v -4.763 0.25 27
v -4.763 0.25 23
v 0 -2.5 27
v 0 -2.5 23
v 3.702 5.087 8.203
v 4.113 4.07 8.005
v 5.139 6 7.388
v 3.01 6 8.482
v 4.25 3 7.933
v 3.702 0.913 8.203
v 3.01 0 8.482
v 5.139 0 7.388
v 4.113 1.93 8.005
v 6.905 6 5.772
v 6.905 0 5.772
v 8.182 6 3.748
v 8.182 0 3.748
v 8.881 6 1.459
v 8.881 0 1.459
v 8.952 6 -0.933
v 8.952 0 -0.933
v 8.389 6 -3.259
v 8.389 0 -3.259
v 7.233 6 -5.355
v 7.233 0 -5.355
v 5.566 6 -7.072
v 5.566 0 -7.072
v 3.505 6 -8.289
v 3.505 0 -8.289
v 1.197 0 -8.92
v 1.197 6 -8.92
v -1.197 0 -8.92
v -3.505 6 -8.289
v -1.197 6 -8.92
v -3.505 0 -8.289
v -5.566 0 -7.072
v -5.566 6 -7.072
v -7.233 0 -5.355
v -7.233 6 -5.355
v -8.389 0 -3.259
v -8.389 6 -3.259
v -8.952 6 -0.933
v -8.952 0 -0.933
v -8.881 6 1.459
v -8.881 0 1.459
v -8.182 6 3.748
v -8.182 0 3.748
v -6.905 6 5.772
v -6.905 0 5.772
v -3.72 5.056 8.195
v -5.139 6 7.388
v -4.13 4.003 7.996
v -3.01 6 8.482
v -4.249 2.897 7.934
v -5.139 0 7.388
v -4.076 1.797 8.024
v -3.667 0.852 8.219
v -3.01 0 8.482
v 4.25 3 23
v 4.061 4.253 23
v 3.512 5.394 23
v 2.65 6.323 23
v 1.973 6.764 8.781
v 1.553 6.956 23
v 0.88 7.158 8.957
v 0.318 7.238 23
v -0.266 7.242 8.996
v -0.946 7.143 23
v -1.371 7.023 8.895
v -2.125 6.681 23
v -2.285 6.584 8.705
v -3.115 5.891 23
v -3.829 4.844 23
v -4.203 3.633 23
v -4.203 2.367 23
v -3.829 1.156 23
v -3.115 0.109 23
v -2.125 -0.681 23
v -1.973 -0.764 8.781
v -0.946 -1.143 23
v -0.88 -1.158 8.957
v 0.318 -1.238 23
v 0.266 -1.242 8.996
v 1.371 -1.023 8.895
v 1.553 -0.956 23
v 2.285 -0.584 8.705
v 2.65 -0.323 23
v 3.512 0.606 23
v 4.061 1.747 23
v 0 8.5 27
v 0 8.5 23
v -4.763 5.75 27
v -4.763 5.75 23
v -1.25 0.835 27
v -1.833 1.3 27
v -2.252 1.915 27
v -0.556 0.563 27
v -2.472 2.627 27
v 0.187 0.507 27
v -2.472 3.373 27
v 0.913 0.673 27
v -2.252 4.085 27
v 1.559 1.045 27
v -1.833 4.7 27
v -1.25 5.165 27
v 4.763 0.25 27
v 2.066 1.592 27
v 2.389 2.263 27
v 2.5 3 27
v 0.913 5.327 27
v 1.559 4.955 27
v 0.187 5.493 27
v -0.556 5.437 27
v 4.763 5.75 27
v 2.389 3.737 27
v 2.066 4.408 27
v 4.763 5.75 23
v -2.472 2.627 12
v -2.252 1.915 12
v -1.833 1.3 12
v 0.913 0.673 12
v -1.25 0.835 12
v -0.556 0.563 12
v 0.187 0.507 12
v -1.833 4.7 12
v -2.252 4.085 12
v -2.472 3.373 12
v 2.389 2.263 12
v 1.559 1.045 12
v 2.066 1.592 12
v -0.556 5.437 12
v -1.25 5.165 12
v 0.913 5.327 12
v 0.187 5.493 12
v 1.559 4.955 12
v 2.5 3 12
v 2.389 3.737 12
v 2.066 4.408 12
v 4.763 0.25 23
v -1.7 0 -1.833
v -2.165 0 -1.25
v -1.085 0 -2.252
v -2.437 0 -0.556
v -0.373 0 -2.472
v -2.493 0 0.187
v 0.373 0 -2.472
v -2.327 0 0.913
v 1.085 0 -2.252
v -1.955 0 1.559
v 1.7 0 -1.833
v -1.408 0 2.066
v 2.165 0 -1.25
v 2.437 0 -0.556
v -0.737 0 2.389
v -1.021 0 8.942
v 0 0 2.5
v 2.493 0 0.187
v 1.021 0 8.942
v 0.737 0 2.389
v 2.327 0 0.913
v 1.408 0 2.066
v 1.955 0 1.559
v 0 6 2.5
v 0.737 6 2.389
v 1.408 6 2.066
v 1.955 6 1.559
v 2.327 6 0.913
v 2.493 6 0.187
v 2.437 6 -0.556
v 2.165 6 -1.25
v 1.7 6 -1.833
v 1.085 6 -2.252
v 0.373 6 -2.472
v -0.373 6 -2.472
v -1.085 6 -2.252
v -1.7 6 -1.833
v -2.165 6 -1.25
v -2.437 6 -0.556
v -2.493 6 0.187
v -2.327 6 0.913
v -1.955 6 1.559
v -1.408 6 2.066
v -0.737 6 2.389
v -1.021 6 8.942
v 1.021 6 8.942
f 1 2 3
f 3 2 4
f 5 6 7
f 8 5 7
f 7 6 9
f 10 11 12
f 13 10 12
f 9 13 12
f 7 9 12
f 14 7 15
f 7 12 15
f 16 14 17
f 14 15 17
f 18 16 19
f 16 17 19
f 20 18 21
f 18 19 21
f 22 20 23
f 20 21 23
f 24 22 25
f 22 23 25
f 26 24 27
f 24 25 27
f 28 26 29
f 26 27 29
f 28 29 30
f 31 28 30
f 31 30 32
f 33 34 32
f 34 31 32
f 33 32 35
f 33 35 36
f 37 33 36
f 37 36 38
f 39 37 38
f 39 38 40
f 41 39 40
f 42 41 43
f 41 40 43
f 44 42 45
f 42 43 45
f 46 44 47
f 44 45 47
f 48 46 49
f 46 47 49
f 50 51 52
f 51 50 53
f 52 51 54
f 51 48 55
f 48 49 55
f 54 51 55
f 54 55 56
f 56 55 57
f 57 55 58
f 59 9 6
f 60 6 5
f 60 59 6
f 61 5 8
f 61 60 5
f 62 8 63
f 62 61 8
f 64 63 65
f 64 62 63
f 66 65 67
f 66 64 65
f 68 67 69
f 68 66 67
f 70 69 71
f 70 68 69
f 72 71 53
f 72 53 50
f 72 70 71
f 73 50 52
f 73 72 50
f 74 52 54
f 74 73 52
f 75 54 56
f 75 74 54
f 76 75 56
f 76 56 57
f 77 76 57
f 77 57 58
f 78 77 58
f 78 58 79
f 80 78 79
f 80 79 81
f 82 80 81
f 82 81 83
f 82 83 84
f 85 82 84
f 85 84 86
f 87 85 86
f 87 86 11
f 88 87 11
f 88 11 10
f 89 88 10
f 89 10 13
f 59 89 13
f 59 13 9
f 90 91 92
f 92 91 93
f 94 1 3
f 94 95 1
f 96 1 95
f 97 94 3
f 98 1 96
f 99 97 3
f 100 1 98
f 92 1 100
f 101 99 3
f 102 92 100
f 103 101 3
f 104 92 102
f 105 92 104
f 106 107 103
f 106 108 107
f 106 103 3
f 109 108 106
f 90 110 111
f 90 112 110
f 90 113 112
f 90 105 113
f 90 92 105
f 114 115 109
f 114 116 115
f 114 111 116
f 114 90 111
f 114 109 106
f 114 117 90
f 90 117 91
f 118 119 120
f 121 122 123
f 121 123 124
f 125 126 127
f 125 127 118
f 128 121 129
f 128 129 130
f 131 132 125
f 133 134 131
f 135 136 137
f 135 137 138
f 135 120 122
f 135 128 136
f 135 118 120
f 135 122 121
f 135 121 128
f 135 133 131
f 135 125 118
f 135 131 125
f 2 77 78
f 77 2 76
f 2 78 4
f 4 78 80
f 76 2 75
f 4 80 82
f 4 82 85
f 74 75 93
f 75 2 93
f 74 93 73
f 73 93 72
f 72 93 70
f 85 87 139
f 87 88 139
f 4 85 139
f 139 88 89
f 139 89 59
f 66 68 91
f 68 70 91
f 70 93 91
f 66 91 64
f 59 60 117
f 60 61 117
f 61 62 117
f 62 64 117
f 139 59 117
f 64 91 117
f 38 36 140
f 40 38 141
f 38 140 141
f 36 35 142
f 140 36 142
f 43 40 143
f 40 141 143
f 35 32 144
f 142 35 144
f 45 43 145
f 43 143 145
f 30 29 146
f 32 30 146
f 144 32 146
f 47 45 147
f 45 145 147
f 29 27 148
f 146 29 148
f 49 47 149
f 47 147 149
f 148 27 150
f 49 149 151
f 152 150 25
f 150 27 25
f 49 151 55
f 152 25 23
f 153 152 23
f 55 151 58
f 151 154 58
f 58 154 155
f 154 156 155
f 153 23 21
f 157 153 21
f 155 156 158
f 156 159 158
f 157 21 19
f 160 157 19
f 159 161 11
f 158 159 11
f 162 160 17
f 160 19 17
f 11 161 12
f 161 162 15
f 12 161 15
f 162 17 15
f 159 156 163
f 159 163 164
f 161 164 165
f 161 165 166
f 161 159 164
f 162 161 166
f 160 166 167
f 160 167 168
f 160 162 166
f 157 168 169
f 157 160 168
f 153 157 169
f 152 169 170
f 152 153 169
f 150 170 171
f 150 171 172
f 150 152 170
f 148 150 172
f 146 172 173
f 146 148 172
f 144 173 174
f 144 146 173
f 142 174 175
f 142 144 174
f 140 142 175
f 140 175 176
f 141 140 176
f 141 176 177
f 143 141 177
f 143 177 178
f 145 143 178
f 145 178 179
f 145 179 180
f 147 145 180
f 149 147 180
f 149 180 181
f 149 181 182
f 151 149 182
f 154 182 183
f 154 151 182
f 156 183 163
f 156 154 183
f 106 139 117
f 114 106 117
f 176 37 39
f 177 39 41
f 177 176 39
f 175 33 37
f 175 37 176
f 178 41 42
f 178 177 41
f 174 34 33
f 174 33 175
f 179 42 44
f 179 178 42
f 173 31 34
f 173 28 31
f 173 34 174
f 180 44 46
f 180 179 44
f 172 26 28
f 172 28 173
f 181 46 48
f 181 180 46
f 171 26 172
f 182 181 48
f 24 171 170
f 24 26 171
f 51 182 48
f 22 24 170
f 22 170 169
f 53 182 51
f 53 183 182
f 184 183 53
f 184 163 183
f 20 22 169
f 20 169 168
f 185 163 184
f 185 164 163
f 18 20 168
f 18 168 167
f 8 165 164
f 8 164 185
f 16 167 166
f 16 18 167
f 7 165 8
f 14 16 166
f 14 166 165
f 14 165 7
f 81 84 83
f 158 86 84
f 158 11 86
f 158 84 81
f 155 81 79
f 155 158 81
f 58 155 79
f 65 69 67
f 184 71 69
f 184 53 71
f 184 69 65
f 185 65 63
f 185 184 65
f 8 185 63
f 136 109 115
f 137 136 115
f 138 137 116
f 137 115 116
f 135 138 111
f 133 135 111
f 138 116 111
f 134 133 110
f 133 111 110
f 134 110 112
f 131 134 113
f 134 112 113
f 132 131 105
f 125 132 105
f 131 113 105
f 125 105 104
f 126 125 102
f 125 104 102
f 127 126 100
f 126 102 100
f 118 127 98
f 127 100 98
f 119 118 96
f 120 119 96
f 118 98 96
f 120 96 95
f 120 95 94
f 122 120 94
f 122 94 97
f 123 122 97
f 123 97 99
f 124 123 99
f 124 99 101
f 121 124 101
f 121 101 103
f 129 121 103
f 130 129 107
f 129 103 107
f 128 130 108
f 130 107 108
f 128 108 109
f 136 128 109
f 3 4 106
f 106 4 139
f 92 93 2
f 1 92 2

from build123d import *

# Parameters (mm, degrees)
SKETCH_1_R          = 9
SKETCH_1_R_2        = 2.5
EXTRUDE_1_DEPTH     = 6
SKETCH_2_R          = 4.25
EXTRUDE_2_DEPTH     = 18
SKETCH_3_R          = 9
CUT_EXTRUDE_1_DEPTH = 26.740289584
SKETCH_4_R          = 9
CUT_EXTRUDE_2_DEPTH = 26.740289584
EXTRUDE_3_DEPTH     = 4
SKETCH_6_R          = 2.5
CUT_EXTRUDE_3_DEPTH = 15


with BuildPart() as part:
    # 草图1 → 凸台-拉伸1 (new body)
    with BuildSketch(Plane(origin=(0, 0, 0), x_dir=(1, 0, 0), z_dir=(0, 1, 0))):
        with Locations(Location((0, 0, 0), (0, 0, 270))):
            Circle(SKETCH_1_R)
        with Locations(Location((0, 0, 0), (0, 0, 270))):
            Circle(SKETCH_1_R_2, mode=Mode.SUBTRACT)
    extrude(amount=EXTRUDE_1_DEPTH)

    # 草图2 → 凸台-拉伸2 (add)
    with BuildSketch(Plane.XY.offset(23)):
        with Locations((0, 3)):
            Circle(SKETCH_2_R)
    extrude(amount=-EXTRUDE_2_DEPTH)

    # 草图3 → 切除-拉伸1 (cut, through all)
    with BuildSketch(Plane(origin=(0, 6, 0), x_dir=(1, 0, 0), z_dir=(0, 1, 0))):
        Circle(SKETCH_3_R)
    extrude(amount=CUT_EXTRUDE_1_DEPTH, mode=Mode.SUBTRACT)

    # 草图4 → 切除-拉伸2 (cut, through all)
    with BuildSketch(Plane.XZ):
        Circle(SKETCH_4_R)
    extrude(amount=CUT_EXTRUDE_2_DEPTH, mode=Mode.SUBTRACT)

    # 草图5 → 凸台-拉伸3 (add)
    with BuildSketch(Plane.XY.offset(23)):
        Polygon((0, 8.5), (-4.763139721, 5.75), (-4.763139721, 0.25), (0, -2.5), (4.763139721, 0.25), (4.763139721, 5.75), align=None)
    extrude(amount=EXTRUDE_3_DEPTH)

    # 草图6 → 切除-拉伸3 (cut)
    with BuildSketch(Plane.XY.offset(27)):
        with Locations((0, 3)):
            Circle(SKETCH_6_R)
    extrude(amount=-CUT_EXTRUDE_3_DEPTH, mode=Mode.SUBTRACT)


solid = part.part
